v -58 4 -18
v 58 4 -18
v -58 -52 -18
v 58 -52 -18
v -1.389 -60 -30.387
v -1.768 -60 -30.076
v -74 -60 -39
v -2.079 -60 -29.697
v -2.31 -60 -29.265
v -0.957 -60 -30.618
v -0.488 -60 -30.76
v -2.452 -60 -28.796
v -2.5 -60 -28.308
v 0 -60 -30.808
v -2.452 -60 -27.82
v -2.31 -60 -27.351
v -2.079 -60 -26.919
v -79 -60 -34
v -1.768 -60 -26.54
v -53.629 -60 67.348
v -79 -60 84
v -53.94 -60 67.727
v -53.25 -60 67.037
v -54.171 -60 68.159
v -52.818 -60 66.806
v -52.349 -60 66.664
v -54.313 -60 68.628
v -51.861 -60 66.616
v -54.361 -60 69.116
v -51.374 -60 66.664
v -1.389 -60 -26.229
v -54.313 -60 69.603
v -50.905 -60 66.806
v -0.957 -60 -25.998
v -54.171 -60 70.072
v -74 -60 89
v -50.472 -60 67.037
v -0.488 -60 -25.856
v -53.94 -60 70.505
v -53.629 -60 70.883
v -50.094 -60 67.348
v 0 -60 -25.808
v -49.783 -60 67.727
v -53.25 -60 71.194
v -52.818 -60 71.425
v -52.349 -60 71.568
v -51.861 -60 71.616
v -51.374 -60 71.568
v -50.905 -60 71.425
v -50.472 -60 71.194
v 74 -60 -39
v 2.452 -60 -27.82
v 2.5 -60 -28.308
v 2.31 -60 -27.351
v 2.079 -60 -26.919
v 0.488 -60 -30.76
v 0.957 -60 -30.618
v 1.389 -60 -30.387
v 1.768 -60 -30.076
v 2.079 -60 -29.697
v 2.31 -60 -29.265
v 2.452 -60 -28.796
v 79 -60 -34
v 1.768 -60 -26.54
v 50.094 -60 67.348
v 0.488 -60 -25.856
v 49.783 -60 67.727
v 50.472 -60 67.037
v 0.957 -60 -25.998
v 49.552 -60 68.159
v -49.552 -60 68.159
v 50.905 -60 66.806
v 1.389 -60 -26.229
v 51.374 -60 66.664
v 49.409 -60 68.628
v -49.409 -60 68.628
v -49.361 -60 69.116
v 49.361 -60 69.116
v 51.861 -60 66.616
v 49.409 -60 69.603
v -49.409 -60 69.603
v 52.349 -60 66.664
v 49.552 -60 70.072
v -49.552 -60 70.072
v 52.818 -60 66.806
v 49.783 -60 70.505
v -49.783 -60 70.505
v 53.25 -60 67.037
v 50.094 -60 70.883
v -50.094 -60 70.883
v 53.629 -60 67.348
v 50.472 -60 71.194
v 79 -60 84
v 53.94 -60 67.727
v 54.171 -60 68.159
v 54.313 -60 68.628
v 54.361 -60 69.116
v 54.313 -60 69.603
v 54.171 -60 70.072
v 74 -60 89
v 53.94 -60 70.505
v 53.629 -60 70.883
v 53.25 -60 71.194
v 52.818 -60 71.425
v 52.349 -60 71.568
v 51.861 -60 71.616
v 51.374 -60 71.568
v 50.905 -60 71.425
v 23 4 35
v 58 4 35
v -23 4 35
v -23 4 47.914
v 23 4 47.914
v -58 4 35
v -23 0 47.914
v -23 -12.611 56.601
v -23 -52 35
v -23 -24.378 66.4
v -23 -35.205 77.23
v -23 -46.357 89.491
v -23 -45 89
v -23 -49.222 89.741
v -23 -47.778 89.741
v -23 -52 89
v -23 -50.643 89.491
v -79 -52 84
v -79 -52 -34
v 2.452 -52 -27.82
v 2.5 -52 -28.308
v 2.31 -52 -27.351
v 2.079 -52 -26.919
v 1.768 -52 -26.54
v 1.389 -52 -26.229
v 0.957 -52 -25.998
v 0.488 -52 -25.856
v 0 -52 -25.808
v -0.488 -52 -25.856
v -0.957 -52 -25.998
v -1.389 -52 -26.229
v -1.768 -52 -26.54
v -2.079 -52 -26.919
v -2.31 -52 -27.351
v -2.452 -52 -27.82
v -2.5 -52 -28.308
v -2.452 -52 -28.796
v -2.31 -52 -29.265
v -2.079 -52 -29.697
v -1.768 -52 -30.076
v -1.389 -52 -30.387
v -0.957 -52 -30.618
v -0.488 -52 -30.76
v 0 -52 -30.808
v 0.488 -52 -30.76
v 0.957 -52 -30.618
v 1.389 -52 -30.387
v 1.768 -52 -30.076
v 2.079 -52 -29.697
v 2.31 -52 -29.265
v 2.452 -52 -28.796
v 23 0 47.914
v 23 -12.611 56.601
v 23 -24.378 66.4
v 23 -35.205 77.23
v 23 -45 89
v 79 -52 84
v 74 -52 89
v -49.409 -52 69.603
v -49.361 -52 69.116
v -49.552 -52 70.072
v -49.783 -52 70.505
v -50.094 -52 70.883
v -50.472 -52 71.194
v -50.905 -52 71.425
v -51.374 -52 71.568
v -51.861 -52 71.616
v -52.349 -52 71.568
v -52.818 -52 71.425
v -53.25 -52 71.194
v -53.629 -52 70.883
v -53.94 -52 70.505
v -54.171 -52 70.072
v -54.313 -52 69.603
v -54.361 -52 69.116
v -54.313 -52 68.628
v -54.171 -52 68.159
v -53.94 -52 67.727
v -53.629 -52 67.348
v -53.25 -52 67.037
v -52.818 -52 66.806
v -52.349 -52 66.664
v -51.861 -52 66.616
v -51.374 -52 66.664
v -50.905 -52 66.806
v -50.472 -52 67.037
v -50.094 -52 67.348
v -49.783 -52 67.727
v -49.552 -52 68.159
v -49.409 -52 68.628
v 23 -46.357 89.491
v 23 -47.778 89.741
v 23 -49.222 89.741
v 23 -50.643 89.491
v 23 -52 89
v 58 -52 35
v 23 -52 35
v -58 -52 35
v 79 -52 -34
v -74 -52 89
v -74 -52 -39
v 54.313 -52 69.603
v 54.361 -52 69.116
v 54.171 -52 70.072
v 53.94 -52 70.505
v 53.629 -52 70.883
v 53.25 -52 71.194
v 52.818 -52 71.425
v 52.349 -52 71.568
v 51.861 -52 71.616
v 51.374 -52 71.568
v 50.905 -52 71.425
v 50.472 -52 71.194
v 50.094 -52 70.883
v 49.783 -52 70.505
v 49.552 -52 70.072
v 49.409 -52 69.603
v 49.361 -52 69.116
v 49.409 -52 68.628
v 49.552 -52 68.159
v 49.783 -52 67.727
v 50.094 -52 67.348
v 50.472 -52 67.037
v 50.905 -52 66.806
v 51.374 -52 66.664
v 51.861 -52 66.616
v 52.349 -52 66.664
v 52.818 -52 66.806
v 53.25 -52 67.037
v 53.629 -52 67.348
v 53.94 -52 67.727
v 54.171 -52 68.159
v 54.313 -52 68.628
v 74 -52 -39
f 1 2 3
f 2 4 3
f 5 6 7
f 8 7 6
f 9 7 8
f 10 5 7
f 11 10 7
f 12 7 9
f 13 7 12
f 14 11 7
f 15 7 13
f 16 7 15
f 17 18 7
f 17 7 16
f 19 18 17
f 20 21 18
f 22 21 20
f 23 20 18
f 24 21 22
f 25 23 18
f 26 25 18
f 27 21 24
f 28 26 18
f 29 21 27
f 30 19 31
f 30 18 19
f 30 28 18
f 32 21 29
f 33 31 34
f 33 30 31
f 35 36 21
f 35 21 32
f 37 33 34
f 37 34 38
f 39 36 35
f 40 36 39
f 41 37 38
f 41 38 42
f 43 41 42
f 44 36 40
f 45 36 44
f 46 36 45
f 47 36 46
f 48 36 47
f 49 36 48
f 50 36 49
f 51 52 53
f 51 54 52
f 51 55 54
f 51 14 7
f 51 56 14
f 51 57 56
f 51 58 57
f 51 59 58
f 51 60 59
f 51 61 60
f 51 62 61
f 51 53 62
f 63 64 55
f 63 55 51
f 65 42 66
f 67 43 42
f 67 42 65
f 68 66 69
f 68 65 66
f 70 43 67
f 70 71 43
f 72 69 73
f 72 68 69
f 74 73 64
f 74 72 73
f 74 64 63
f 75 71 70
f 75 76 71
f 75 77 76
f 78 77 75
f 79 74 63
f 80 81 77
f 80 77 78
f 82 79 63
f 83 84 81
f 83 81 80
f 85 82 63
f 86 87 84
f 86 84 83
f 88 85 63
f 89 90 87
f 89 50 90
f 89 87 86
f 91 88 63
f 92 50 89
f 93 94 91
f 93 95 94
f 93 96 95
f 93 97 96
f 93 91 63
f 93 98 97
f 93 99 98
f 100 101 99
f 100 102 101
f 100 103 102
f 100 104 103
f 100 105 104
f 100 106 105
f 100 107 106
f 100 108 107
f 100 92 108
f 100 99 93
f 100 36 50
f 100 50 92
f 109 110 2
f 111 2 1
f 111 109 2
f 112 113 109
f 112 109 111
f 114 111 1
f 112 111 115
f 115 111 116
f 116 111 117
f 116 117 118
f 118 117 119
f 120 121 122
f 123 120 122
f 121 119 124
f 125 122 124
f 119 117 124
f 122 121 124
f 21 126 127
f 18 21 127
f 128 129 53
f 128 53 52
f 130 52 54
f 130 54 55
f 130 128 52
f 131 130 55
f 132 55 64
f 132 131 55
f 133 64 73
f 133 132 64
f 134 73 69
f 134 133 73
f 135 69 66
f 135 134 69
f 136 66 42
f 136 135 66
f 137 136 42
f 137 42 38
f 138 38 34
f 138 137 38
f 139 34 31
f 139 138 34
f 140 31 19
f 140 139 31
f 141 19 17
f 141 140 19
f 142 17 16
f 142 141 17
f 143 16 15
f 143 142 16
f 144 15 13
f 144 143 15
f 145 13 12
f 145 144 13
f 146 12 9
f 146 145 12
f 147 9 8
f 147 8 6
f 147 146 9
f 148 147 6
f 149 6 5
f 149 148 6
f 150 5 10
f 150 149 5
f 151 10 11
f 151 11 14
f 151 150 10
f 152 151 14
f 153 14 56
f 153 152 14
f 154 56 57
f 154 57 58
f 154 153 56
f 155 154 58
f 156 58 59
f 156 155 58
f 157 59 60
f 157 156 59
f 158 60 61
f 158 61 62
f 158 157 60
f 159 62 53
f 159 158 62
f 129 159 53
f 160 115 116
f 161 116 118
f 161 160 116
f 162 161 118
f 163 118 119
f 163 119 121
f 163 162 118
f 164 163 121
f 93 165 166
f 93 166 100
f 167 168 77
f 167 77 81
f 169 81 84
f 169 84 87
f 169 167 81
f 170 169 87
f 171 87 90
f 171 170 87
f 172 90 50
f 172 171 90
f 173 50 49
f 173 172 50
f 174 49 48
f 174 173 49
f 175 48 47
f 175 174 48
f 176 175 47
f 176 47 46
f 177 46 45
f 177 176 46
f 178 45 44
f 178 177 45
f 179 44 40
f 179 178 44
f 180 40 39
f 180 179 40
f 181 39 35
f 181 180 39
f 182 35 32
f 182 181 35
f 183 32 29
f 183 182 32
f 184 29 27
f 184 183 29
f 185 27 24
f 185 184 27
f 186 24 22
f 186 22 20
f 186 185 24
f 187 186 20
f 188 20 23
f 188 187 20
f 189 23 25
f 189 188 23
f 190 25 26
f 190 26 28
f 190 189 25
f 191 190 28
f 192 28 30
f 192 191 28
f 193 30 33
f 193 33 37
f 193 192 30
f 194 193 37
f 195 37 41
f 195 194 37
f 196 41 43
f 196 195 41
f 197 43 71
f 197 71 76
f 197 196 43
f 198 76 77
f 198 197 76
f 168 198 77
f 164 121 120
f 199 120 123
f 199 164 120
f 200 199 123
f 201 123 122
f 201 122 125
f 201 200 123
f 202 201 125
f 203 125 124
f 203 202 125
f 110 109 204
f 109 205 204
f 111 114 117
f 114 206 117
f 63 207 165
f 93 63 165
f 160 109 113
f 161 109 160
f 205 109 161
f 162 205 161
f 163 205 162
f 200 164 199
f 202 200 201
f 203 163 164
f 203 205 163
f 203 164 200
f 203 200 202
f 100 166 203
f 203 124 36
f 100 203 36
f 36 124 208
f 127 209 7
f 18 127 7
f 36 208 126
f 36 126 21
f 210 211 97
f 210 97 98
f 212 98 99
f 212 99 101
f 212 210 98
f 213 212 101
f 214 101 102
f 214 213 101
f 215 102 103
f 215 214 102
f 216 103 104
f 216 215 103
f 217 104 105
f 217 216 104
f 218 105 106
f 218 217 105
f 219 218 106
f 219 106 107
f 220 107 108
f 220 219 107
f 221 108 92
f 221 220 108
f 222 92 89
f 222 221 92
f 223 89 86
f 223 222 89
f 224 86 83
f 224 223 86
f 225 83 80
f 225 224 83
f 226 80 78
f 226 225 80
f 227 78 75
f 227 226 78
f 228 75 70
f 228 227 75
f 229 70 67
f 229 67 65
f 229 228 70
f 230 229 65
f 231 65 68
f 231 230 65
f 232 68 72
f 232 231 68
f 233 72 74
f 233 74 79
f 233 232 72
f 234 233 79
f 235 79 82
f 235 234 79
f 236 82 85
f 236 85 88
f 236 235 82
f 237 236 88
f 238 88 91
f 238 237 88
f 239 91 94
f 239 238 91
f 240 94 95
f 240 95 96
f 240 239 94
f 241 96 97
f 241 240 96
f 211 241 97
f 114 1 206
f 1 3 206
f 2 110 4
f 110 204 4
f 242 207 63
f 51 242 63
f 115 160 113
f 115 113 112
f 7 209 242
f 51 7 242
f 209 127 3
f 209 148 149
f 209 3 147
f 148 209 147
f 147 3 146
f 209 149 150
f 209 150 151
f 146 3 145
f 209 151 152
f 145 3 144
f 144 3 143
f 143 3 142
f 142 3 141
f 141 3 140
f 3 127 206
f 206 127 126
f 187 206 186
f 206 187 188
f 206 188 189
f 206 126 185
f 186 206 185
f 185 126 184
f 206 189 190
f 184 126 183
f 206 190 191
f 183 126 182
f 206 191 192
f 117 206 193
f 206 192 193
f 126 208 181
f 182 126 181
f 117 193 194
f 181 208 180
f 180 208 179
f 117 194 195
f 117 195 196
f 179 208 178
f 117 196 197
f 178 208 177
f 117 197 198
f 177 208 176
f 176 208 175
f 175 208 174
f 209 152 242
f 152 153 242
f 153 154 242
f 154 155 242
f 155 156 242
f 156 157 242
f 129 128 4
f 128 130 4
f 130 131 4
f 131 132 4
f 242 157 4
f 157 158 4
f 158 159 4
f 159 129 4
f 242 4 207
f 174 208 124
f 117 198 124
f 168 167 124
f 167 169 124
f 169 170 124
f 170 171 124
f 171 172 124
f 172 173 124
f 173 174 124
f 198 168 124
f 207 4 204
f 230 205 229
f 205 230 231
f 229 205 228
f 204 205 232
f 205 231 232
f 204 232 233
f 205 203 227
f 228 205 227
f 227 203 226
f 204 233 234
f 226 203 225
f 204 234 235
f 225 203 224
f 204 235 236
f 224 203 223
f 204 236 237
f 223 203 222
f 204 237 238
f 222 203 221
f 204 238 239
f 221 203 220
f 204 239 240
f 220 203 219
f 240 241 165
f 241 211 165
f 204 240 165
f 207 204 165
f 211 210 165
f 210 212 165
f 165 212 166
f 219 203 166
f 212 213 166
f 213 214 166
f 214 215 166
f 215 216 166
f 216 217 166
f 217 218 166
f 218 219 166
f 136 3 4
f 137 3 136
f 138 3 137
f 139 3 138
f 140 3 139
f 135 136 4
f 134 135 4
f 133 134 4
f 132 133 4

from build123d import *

# Parameters (mm, degrees)
F0_W     = 116
F0_H     = 53
F1_DEPTH = 52
F3_DEPTH = 23
F4_R     = 2.5
F5_DEPTH = 8
F6_SIZE  = 5
F7_W     = 46
F7_H     = 12.914198093
F8_DEPTH = 4


# Not quite as in the source:
# - a feature names something its author has since deleted; it is built from what else it names


with BuildPart() as f1:
    # F0 (on Front) → F1 (new body)
    with BuildSketch(Plane.XZ):
        with Locations((0, 8.5)):
            Rectangle(F0_W, F0_H)
    extrude(amount=F1_DEPTH)

    # F2 (on Right) → F3 (join, symmetric)
    with BuildSketch(Plane.YZ):
        with BuildLine():
            Line((-45, 35), (0, 35))
            Line((0, 35), (0, 47.914198093))
            ThreePointArc((0, 47.914198093), (-24.3783358313, 66.3998162753), (-45, 89))
            Line((-45, 89), (-45, 35))
        make_face()
        with BuildLine():
            Line((-52, 35), (-45, 35))
            Line((-45, 35), (-45, 89))
            ThreePointArc((-45, 89), (-48.5, 89.7722433198), (-52, 89))
            Line((-52, 89), (-52, 35))
        make_face()
    extrude(amount=F3_DEPTH, both=True)

    # F4 (on face) → F5 (join)
    with BuildSketch(Plane.XZ.offset(52)):
        Polygon((-23, 89), (-79, 89), (-79, -39), (79, -39), (79, 89), (23, 89), (23, 35), (58, 35), (58, -18), (-58, -18), (-58, 35), (-23, 35), align=None)
        with Locations((0, -28.3078663051)):
            Circle(F4_R, mode=Mode.SUBTRACT)
        with Locations((-51.8612675369, 69.1157281399)):
            Circle(F4_R, mode=Mode.SUBTRACT)
        with Locations((51.8612675369, 69.1157281399)):
            Circle(F4_R, mode=Mode.SUBTRACT)
        Polygon((23, 89), (-23, 89), (-23, 35), (-58, 35), (-58, -18), (58, -18), (58, 35), (23, 35), align=None)
    extrude(amount=F5_DEPTH)

    # F6
    f6_edges = [f1.edges().sort_by_distance(p)[0] for p in [
        (-79, -56, 89),
        (79, -56, 89),
        (79, -56, -39),
        (-79, -56, -39),
    ]]
    chamfer(f6_edges, length=F6_SIZE)

    # F7 (on face) → F8 (join)
    with BuildSketch(Plane(origin=(0, 0, 0), x_dir=(-1, 0, 0), z_dir=(0, 1, 0))):
        with Locations((0, 41.4570990465)):
            Rectangle(F7_W, F7_H)
        Polygon((-23, 35), (-58, 35), (-58, -18), (58, -18), (58, 35), (23, 35), align=None)
    extrude(amount=F8_DEPTH)


solid = f1.part
